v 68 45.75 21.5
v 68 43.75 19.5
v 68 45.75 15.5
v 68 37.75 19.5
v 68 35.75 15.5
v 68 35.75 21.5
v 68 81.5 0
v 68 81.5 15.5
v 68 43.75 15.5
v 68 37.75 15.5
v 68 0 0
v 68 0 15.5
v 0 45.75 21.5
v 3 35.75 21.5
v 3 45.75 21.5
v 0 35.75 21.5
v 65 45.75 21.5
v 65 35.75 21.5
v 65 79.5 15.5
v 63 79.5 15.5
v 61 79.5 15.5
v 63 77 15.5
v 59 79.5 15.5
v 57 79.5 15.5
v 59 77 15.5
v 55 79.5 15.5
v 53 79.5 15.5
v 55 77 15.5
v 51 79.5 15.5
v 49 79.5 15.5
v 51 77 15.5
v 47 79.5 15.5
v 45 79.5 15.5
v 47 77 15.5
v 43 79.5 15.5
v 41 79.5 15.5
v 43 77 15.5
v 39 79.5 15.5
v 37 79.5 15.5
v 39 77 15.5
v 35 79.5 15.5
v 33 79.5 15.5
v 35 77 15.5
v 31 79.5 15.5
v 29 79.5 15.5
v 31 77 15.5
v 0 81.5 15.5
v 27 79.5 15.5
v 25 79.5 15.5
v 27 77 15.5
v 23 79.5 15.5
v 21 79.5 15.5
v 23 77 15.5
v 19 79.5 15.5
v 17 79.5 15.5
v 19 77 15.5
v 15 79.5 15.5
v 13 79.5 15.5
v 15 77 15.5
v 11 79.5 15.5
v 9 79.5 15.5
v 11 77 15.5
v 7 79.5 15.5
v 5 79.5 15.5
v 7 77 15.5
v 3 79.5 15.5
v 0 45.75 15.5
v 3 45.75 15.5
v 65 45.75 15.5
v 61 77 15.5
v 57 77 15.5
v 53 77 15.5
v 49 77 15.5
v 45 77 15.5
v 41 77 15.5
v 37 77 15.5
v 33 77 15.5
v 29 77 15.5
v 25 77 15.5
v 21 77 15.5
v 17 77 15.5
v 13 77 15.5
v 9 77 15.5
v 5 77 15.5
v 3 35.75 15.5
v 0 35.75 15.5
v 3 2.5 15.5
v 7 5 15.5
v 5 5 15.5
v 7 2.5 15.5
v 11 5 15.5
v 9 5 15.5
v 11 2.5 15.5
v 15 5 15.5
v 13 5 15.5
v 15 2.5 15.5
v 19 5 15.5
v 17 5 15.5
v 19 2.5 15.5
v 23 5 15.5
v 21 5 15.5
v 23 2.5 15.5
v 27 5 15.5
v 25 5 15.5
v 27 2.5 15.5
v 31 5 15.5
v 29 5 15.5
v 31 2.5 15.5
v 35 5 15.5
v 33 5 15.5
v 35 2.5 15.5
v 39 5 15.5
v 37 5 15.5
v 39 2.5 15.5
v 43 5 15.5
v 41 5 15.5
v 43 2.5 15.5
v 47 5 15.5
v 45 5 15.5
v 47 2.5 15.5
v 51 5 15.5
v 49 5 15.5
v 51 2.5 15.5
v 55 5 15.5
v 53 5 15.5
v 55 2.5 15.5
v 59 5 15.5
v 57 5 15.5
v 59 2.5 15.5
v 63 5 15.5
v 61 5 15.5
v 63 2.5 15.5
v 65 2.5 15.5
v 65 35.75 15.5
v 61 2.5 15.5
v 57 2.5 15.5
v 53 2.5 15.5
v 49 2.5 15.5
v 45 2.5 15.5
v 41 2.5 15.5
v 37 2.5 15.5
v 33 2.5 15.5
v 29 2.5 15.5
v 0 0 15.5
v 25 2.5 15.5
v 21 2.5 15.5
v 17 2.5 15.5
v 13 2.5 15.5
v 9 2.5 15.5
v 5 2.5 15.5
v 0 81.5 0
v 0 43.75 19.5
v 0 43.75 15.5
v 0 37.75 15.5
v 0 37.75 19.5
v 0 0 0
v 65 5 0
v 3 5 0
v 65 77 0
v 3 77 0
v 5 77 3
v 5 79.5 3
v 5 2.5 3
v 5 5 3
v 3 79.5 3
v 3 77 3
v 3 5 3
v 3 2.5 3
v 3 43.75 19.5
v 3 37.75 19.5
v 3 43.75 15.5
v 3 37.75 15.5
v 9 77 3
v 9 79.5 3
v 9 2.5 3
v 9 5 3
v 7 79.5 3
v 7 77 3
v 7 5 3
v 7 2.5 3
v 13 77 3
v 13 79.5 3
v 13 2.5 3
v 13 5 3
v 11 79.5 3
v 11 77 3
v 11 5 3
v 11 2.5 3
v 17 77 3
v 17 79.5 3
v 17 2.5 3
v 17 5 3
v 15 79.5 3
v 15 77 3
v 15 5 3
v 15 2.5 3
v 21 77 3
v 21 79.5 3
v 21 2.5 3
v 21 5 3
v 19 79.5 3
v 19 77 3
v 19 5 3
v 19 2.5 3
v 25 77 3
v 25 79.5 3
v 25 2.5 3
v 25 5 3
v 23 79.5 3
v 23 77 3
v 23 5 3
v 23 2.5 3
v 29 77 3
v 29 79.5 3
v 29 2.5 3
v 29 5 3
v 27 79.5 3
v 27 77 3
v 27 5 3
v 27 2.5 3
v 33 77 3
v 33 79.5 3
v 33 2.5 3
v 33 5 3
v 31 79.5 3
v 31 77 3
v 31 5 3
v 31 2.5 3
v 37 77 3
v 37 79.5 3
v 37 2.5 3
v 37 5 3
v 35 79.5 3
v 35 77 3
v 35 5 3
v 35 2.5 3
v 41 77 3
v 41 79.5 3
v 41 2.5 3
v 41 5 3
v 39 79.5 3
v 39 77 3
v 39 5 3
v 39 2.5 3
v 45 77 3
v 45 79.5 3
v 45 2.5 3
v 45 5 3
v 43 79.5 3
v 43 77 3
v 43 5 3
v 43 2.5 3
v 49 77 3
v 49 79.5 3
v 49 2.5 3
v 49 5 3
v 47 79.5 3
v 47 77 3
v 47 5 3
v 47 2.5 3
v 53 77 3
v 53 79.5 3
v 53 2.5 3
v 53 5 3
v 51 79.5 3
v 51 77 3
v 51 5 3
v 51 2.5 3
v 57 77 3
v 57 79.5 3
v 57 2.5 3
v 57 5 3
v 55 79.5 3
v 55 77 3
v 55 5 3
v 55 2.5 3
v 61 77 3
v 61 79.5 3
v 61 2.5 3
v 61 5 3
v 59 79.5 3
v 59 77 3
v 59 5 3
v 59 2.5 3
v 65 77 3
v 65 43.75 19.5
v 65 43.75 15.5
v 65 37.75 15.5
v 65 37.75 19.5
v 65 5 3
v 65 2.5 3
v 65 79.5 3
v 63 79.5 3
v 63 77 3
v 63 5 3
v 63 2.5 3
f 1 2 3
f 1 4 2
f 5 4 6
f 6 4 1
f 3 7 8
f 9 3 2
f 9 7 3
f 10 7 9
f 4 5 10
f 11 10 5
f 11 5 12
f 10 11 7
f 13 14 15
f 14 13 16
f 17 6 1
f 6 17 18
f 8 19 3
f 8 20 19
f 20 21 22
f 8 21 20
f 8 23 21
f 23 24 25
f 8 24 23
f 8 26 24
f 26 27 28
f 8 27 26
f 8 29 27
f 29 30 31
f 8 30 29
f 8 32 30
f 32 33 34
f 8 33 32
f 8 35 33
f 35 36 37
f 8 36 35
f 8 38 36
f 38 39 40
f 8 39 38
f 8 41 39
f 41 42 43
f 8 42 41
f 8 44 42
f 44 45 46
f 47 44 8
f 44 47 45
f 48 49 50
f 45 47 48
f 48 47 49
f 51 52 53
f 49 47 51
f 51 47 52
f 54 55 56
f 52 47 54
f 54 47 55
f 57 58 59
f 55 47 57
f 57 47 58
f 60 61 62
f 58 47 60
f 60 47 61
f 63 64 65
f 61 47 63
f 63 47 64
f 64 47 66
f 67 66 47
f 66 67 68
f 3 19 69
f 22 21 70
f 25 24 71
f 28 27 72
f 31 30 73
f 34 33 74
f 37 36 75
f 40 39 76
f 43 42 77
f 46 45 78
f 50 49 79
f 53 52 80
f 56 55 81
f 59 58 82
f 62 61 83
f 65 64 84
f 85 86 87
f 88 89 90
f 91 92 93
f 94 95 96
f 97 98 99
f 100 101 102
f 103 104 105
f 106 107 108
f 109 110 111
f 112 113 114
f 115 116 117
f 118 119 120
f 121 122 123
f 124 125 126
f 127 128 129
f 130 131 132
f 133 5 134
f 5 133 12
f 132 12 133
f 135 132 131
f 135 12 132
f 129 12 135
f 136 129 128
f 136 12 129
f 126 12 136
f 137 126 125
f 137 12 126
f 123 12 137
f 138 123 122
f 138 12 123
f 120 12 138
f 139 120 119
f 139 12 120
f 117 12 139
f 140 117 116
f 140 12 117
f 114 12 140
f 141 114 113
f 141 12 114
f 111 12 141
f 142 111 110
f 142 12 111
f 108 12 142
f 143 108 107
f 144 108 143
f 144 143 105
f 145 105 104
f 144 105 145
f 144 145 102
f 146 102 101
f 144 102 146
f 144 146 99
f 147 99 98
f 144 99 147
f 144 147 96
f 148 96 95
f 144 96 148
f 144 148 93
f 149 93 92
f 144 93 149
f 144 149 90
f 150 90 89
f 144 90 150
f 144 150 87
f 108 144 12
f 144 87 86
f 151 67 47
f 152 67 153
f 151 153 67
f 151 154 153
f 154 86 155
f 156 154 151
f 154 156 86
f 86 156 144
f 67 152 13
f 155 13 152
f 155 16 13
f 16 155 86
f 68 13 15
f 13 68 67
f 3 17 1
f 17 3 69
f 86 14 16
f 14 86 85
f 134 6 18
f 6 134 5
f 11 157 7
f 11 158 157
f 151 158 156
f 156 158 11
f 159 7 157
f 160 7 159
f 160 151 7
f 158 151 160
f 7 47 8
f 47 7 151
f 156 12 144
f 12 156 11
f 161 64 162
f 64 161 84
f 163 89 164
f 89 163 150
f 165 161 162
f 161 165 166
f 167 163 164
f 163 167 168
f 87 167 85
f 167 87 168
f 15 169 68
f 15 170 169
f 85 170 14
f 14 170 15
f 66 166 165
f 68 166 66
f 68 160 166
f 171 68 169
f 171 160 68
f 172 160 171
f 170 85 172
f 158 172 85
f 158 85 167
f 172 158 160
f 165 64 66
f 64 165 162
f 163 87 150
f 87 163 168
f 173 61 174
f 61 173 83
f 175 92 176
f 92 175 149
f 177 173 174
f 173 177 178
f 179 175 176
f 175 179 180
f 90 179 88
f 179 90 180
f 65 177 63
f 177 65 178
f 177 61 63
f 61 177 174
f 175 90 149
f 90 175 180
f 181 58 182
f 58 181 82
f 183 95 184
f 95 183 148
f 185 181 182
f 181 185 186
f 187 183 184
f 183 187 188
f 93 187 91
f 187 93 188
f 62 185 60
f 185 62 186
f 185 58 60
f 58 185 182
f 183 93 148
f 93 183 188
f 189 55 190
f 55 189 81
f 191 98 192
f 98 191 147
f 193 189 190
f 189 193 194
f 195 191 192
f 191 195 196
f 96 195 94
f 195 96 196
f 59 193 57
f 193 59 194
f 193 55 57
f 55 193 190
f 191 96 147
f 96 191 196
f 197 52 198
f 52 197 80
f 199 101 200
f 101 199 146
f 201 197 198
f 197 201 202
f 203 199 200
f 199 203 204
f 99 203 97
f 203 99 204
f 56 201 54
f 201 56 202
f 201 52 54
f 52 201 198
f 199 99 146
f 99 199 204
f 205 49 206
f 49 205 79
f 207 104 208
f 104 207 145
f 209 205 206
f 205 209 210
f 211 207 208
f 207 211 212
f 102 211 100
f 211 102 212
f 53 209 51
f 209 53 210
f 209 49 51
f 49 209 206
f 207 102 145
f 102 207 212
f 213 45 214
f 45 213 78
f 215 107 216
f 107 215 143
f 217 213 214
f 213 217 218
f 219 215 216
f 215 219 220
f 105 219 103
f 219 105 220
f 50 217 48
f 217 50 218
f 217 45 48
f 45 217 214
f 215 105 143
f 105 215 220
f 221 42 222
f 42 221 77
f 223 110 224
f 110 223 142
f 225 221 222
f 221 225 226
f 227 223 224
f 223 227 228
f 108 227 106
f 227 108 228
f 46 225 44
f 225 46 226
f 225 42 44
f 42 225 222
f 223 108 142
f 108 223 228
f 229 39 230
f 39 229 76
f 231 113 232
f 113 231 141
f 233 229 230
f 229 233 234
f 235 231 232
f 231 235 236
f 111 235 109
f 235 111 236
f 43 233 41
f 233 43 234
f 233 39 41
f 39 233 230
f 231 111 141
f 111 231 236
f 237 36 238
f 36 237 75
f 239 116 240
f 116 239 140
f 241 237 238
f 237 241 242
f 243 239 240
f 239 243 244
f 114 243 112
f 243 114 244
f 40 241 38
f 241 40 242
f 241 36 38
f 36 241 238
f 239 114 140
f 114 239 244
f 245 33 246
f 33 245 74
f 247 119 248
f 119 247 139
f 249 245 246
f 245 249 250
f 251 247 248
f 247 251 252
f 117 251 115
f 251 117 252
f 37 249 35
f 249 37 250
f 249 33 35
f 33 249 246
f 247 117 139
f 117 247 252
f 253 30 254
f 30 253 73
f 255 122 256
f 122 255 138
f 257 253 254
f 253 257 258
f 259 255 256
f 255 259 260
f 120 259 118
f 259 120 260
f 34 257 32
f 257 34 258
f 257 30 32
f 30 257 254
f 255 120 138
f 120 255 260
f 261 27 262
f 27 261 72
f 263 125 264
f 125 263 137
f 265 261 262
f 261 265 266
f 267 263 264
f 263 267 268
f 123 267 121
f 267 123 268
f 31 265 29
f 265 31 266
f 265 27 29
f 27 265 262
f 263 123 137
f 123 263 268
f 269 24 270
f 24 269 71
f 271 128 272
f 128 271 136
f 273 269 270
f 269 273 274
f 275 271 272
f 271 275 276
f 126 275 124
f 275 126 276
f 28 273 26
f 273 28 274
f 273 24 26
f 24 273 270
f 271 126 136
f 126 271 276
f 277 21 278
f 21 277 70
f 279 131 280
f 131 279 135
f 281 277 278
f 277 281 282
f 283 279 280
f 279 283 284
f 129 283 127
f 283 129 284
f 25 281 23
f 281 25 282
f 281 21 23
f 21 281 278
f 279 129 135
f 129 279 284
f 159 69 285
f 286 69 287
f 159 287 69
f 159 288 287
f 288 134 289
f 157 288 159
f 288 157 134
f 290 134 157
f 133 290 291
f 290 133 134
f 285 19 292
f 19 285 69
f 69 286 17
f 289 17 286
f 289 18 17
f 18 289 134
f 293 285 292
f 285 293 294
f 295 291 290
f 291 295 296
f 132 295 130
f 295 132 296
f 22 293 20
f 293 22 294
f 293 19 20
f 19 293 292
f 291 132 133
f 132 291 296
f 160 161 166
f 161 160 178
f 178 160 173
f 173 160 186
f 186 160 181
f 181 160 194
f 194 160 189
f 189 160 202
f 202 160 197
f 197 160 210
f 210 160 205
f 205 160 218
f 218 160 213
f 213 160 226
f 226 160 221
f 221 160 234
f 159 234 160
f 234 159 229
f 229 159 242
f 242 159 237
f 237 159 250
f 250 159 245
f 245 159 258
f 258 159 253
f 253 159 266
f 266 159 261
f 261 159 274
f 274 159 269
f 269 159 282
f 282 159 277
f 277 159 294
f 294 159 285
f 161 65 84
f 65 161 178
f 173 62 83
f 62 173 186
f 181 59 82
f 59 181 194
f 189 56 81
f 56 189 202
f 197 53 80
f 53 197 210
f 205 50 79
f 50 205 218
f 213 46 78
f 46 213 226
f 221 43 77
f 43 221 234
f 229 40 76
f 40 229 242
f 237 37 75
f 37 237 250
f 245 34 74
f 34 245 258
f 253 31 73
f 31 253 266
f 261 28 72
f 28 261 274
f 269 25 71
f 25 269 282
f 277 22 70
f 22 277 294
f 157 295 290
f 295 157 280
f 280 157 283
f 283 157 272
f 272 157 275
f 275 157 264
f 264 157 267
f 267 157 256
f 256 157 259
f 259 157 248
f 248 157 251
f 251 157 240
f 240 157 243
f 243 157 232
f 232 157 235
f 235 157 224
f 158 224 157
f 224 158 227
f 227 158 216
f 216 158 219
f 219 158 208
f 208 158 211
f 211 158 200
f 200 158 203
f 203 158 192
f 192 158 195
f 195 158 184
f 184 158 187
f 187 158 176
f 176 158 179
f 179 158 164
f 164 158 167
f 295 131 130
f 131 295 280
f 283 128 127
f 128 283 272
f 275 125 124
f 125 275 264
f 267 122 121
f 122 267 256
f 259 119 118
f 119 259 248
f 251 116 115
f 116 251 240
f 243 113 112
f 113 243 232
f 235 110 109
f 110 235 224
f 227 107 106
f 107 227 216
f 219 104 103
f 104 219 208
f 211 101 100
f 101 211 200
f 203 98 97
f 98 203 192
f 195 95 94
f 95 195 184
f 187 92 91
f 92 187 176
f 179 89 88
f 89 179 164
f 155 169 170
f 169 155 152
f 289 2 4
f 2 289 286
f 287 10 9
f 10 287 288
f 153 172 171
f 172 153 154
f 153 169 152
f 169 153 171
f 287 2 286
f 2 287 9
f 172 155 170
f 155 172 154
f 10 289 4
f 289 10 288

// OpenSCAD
// Lucas Wilder - Michigan Technological University - EE 4777
// Microscope Slide Holder

// Number of slides
slides = 15;

// Slide thickness in mm
thickness = 1;

// Slide length in mm
length = 75;

//Slide width in mm
width = 25;

difference()
{
	// Union of main part to handle mounts
	union()
	{
		// Handle mounts
		translate([(4*slides+8)/2,(length+6.5)/2,(width/2)+6])
		cube(size = [4*slides+8,10,6],center = true);

		// Main body
		cube(size = [4*slides+8,length+6.5,(width/2)+3], center = false);
		
	}
	
	// Slides with tolerance
	for(i=[0:1:slides])
	{
		translate([3+(4*i),2.5,3]) 
		cube(size = [thickness+1,length+2,width],center = false);
	}
	
	// Center cut
	translate([3,5,-1])
	cube(size = [4*slides+2,length-3,width+4], center = false);
	
	//Handle slots
	translate([(4*slides+8)/2,(length+6.5)/2,(width/2)+5])
	cube(size = [4*slides+8,6,4],center = true);

}
